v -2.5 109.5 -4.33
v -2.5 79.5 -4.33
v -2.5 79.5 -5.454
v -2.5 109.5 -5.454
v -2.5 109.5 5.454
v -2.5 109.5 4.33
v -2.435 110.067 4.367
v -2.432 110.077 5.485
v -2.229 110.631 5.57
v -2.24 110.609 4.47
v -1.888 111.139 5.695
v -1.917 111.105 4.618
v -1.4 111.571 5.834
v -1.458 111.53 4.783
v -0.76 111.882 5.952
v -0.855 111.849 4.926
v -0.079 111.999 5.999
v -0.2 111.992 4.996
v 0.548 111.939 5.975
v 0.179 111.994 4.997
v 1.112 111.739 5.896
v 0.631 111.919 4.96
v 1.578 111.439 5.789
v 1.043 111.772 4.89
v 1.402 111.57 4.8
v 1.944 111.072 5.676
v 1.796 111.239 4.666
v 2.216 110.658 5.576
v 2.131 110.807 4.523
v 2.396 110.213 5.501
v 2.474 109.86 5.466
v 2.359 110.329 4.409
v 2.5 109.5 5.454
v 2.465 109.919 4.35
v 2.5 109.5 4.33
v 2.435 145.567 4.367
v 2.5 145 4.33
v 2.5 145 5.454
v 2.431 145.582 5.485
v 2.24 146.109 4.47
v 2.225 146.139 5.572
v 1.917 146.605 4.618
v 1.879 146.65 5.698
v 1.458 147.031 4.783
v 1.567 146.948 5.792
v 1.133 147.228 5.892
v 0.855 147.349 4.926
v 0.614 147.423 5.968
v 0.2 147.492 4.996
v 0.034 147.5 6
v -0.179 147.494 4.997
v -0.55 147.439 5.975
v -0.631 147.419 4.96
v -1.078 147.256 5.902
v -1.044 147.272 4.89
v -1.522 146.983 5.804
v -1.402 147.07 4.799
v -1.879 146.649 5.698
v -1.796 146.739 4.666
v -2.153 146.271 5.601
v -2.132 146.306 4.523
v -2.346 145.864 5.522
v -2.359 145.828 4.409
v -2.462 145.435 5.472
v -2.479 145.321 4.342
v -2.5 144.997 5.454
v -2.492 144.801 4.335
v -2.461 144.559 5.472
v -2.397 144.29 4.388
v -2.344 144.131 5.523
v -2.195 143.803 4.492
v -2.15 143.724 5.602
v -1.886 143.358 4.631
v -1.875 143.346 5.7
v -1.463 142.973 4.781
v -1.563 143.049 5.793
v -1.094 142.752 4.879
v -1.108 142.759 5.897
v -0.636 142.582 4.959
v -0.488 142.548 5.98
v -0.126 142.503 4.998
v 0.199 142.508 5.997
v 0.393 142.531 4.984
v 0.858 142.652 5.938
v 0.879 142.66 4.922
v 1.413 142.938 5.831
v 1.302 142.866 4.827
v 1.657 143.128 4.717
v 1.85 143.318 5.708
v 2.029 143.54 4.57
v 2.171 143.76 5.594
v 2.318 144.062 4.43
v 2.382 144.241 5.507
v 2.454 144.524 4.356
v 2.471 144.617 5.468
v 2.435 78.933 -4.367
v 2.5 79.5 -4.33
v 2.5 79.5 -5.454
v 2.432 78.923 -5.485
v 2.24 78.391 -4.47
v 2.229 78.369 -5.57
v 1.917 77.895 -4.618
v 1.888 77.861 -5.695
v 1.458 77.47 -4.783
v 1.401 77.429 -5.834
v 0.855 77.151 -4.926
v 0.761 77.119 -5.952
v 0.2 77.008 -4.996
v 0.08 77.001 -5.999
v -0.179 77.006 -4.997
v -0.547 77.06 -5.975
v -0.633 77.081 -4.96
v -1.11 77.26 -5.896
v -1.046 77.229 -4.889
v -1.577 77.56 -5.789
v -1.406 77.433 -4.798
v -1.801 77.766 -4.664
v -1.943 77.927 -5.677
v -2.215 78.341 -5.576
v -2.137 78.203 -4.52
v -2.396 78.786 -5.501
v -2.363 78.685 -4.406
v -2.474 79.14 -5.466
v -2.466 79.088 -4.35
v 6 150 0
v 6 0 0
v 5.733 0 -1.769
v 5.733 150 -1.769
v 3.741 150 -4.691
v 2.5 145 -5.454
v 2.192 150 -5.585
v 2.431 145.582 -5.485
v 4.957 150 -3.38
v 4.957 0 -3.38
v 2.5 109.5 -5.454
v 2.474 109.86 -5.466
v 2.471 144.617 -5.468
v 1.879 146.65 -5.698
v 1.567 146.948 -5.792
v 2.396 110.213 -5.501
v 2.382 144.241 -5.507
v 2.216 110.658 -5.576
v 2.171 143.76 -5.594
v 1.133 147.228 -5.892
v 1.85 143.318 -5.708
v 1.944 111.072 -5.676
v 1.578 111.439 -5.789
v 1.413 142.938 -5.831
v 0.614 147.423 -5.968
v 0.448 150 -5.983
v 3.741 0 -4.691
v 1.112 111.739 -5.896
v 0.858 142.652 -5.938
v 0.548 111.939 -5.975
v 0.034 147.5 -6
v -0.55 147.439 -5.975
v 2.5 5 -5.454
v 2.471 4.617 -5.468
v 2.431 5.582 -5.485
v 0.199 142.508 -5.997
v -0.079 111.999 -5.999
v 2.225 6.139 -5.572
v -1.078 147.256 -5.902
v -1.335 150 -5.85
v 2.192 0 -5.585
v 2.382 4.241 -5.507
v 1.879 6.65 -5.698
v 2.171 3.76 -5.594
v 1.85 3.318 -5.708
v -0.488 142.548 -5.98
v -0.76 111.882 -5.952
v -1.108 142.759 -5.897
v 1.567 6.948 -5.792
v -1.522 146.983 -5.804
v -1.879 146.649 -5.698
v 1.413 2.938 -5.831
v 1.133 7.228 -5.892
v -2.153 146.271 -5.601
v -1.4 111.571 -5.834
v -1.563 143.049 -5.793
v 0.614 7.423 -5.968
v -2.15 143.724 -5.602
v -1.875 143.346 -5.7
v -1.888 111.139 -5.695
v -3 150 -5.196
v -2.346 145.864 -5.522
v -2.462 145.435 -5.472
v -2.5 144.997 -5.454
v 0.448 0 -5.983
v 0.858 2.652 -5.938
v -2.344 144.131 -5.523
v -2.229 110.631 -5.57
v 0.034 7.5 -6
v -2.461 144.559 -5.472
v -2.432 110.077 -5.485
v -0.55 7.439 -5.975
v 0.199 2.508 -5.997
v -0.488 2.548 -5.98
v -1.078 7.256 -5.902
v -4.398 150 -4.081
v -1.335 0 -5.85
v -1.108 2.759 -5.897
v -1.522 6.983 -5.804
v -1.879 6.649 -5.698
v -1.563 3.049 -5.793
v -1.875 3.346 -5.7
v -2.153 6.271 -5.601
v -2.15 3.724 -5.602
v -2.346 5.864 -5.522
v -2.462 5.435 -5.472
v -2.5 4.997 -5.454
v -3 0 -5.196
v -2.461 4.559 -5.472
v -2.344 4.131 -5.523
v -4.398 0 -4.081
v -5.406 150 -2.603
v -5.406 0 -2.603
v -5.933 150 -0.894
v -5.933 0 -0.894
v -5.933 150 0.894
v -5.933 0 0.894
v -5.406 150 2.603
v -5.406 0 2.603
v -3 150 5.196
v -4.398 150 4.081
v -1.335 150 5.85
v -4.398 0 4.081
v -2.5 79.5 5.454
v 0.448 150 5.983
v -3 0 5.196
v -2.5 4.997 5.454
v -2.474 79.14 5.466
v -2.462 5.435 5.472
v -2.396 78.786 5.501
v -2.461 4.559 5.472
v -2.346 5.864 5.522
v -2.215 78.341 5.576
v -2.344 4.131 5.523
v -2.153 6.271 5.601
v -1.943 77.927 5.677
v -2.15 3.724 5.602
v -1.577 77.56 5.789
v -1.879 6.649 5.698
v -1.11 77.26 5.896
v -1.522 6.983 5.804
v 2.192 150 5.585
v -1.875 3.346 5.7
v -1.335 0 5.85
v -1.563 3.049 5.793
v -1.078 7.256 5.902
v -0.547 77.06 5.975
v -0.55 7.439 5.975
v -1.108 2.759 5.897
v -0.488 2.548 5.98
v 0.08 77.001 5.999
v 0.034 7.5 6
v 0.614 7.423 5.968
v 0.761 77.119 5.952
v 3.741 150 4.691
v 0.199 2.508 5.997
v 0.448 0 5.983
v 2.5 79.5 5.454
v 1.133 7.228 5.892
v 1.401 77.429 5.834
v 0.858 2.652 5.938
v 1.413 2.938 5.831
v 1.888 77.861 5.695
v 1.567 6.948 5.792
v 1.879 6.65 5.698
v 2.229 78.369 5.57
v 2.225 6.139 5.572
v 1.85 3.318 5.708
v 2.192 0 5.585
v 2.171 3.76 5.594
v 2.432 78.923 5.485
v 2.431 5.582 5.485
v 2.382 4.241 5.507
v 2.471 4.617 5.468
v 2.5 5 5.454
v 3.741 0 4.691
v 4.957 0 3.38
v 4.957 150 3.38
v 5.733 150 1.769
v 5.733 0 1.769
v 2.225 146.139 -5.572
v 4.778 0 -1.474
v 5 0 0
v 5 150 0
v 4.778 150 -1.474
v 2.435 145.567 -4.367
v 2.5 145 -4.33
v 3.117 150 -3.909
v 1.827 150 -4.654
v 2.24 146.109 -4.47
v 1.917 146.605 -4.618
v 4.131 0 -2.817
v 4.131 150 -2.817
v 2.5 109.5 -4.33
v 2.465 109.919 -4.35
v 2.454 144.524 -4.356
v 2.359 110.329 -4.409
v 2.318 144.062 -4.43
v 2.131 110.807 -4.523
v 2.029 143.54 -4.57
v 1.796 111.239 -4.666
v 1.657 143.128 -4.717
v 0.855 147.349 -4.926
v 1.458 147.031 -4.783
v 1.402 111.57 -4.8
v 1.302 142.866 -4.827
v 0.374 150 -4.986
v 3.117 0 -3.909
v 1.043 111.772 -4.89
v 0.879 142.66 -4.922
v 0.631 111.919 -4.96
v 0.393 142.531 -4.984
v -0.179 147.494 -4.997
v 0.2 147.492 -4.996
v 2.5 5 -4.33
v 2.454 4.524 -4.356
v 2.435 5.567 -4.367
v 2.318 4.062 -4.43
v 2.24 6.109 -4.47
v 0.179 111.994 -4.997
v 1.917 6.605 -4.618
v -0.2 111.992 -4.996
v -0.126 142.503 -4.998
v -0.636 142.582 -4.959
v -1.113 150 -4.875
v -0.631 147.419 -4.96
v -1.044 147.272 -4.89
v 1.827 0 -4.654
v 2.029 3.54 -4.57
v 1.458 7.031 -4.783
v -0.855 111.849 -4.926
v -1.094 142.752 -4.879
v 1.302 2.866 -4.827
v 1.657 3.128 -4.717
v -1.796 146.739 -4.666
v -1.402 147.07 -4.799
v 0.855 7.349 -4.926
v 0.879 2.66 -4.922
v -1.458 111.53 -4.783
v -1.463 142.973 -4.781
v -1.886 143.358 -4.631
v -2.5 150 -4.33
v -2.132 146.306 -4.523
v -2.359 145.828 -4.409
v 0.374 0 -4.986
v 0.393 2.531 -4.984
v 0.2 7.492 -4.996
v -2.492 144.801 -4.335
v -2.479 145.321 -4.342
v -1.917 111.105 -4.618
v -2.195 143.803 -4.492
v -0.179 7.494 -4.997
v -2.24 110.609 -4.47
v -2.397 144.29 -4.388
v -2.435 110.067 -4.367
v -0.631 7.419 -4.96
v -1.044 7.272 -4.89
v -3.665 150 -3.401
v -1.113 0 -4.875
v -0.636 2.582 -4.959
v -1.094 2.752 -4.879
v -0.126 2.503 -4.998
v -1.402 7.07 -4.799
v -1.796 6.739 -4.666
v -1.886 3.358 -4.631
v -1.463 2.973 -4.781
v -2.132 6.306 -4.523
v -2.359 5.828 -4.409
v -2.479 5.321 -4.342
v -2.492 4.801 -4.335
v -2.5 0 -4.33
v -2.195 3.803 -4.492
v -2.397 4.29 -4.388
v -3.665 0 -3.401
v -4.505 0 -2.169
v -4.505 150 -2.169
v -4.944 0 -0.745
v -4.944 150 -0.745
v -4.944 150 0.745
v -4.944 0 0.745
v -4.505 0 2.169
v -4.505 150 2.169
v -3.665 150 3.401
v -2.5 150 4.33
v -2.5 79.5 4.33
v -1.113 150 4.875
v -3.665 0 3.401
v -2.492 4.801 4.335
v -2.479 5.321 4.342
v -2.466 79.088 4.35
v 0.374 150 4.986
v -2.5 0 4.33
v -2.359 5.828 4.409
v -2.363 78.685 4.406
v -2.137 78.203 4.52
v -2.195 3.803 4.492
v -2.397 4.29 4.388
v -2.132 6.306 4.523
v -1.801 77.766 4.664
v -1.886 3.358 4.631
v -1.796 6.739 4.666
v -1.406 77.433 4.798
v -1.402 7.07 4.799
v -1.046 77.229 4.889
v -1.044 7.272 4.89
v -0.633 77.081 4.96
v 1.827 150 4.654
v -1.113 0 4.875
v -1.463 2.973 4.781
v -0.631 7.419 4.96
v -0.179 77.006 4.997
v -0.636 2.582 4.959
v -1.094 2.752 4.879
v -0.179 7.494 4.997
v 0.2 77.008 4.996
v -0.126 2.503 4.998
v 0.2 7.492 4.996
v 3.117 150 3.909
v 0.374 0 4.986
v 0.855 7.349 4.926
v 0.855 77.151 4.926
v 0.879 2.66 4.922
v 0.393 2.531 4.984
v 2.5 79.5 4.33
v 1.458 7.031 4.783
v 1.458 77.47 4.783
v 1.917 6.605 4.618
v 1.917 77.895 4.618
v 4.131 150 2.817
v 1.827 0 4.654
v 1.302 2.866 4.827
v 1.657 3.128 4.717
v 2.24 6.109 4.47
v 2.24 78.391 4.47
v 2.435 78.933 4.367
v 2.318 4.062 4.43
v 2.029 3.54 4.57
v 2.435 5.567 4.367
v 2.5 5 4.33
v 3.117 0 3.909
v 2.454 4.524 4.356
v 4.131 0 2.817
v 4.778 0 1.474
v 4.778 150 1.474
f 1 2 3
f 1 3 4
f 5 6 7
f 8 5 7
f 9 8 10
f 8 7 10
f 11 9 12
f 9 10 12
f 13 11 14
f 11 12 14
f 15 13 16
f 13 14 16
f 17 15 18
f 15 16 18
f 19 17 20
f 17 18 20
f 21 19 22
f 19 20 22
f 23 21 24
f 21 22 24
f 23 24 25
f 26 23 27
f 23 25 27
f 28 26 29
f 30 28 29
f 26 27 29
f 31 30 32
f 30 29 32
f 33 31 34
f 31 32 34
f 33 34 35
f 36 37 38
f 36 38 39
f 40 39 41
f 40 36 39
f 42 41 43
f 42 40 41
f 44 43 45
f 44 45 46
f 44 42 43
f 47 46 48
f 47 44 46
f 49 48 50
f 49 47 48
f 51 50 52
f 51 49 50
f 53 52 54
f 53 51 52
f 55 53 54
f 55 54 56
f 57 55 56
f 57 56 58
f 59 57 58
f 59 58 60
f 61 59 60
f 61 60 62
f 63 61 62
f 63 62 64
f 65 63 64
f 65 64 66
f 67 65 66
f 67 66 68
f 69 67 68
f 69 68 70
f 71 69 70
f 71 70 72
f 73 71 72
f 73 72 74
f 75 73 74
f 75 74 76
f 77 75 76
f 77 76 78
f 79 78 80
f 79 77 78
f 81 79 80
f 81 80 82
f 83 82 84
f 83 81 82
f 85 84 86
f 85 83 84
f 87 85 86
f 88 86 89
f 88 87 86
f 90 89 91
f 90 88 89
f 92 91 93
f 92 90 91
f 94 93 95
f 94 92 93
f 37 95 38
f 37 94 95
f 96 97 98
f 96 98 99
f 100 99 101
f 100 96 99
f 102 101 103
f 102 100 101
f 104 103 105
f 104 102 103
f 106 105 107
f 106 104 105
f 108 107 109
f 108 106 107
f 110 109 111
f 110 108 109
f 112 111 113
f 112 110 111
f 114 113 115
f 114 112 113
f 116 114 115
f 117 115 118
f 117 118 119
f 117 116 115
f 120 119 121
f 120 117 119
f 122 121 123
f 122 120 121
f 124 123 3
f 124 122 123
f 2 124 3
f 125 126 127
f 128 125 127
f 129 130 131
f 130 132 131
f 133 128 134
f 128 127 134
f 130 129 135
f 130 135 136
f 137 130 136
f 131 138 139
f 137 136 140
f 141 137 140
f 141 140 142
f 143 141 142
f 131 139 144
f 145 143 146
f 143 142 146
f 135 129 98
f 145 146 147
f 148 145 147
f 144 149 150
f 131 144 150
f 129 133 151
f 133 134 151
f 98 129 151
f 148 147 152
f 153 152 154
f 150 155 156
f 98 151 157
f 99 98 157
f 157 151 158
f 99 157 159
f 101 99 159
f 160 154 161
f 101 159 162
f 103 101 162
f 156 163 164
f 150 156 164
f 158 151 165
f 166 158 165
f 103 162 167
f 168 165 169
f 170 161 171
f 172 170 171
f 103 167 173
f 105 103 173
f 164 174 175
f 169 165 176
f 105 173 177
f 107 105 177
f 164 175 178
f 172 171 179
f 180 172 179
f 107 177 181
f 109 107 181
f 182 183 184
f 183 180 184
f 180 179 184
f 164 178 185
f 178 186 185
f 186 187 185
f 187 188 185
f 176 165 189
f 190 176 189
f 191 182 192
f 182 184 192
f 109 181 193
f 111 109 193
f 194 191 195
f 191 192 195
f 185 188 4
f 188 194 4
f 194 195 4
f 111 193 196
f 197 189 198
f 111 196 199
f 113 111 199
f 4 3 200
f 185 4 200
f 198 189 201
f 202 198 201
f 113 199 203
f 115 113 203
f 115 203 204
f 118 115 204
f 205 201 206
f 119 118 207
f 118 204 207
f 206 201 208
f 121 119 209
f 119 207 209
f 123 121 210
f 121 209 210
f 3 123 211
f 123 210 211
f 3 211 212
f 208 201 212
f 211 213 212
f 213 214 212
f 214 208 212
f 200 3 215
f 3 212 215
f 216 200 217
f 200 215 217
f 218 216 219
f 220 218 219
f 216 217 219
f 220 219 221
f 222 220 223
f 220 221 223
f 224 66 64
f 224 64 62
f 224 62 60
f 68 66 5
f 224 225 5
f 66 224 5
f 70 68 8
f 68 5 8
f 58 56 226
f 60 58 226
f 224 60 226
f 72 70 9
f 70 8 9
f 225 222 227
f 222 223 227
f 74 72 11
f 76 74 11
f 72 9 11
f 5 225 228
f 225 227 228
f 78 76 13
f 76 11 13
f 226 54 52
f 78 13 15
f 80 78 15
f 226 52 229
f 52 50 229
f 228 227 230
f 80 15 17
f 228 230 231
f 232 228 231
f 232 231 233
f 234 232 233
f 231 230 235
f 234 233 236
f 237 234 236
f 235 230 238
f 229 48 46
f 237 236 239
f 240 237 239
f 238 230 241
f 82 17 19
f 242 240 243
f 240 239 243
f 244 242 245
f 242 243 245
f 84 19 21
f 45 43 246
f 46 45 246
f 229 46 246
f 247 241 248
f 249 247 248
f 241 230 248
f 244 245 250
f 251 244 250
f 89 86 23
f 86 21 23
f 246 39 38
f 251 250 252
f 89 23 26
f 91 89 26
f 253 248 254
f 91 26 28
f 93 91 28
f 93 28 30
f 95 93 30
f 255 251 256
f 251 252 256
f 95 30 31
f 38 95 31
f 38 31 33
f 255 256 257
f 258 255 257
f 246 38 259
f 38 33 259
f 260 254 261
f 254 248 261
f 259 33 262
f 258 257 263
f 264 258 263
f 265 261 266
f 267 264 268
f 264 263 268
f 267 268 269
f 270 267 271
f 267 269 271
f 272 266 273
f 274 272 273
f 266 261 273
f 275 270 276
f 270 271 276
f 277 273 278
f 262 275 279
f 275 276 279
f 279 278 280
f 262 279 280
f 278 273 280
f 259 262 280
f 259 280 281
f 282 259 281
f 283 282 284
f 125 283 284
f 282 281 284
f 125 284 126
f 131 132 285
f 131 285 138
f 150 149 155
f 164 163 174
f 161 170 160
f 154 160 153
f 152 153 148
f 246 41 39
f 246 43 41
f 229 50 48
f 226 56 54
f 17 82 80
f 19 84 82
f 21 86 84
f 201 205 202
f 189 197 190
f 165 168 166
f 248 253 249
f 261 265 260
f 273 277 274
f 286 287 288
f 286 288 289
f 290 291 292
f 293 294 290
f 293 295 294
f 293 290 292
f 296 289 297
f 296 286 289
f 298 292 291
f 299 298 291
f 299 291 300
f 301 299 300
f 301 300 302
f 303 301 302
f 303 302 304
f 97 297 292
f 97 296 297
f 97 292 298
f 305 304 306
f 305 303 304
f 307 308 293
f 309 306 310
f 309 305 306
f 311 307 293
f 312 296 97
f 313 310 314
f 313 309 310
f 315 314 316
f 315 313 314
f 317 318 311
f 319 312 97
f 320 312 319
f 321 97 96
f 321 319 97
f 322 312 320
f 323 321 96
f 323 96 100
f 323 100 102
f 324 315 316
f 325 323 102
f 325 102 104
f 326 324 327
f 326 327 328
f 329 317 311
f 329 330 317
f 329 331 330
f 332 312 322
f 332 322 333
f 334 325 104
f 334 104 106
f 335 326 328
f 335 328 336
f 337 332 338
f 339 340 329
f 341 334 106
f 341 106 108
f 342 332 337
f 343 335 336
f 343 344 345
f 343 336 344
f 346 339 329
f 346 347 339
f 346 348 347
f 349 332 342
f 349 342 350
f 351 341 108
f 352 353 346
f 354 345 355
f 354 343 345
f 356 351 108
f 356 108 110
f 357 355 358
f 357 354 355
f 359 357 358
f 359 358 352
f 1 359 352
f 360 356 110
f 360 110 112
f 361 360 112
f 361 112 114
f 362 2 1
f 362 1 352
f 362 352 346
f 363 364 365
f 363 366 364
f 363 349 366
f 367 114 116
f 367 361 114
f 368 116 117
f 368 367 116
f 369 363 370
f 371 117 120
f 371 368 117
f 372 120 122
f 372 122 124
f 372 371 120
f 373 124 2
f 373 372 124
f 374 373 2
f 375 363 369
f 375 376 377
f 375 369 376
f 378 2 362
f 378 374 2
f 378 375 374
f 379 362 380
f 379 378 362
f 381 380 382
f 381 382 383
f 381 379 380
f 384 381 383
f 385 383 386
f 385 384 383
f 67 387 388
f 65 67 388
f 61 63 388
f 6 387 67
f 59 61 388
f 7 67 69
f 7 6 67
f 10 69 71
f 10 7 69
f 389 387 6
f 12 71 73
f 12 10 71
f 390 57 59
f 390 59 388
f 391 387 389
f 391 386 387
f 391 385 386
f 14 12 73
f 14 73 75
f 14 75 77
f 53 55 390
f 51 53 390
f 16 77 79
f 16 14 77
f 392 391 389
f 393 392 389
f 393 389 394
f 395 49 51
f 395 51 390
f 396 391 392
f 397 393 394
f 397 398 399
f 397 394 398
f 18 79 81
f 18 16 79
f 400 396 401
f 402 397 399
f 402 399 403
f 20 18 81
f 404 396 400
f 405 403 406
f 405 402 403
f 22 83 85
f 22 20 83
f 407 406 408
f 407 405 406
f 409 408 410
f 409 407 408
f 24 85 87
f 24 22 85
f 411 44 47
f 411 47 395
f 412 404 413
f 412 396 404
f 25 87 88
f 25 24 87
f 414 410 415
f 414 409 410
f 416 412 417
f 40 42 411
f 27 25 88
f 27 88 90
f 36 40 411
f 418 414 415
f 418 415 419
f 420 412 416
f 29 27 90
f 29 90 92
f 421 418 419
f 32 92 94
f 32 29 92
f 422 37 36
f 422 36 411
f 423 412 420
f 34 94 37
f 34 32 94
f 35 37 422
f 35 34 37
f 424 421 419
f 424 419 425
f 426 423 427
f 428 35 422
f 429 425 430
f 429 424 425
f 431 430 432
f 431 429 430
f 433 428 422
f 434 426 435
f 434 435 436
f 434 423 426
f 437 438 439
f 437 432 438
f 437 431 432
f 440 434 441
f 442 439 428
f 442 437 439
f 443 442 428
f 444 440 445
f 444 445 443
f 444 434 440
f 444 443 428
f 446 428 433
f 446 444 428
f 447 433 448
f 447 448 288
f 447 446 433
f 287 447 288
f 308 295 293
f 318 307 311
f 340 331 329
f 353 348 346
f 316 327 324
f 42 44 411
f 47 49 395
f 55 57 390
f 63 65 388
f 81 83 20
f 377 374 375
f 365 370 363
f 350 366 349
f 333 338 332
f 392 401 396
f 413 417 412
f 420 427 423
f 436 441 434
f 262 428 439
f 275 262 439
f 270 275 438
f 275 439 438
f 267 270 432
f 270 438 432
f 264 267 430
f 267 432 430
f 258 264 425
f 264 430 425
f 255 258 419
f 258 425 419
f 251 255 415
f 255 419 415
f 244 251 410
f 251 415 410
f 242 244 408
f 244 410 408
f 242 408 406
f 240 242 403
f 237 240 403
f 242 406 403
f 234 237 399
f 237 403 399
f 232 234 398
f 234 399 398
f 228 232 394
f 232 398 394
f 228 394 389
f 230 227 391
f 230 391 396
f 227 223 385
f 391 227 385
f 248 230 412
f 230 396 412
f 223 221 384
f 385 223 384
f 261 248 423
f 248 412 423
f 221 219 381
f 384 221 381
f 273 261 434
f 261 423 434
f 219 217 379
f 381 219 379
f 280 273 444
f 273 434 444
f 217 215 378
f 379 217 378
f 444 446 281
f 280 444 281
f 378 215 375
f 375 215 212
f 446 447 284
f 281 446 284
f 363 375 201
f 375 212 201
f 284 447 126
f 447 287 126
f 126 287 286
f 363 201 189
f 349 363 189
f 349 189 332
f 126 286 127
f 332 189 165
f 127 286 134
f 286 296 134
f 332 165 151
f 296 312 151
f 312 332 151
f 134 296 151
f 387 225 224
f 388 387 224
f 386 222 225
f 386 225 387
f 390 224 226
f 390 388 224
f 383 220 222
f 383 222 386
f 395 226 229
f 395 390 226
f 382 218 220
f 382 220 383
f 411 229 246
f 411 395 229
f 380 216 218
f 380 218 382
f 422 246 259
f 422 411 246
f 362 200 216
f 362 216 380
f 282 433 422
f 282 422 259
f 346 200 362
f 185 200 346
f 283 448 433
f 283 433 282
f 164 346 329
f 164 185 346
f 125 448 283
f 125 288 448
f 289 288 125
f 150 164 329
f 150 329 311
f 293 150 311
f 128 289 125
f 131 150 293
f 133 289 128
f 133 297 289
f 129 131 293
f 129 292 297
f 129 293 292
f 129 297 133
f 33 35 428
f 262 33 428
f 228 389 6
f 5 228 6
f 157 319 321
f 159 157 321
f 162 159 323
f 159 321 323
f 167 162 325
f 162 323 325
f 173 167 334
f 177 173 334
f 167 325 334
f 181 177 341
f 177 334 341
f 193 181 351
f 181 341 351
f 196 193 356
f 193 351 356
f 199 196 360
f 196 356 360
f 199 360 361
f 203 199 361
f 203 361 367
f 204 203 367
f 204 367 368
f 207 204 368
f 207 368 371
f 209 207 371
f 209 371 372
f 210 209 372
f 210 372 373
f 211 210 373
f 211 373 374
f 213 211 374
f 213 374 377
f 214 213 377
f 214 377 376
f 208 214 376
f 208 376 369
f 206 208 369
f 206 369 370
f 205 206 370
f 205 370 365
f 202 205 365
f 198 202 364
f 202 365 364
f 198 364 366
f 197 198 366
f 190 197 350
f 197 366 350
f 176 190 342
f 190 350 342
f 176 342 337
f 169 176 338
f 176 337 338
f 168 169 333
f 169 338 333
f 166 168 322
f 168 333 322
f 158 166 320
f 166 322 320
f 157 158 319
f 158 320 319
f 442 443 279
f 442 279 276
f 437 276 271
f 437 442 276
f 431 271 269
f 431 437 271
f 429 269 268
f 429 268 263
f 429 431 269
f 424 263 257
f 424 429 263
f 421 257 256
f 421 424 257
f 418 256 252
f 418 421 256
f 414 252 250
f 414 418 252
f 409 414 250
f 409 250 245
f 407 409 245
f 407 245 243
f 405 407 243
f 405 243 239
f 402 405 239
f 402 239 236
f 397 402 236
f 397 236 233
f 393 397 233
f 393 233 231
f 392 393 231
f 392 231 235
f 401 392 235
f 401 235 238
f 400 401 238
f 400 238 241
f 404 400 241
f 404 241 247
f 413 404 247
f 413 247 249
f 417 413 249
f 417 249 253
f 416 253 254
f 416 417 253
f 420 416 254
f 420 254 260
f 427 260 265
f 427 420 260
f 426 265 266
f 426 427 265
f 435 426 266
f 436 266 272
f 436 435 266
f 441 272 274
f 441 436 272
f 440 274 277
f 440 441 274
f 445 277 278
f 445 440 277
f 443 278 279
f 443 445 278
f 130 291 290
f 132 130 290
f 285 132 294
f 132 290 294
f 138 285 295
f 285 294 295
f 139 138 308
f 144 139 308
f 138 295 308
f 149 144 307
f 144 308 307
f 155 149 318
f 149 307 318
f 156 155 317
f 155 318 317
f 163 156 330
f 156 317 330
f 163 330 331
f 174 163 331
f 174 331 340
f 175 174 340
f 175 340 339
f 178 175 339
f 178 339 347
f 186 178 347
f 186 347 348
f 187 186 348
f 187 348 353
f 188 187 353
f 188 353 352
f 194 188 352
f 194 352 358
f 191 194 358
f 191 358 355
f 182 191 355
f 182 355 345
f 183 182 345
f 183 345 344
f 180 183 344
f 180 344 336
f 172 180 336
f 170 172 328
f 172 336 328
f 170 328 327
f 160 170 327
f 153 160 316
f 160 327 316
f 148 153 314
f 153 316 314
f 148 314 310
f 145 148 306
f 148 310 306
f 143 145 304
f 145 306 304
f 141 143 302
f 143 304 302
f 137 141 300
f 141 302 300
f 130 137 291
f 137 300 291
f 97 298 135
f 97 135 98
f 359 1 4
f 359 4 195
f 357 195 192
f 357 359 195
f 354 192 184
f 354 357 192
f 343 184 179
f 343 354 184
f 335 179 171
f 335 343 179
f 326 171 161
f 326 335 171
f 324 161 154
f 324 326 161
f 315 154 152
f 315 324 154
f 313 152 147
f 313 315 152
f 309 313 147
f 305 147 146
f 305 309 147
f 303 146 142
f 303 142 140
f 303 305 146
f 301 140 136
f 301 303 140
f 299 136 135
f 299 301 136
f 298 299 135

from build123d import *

# Parameters (mm, degrees)
SZKIC1_R                        = 6
SZKIC1_R_2                      = 5
DODANIE_WYCI_GNI_CIE1_DEPTH     = 150
SZKIC3_R                        = 2.5
WYTNIJ_WYCI_GNI_CIE2_DEPTH      = 7
WYTNIJ_WYCI_GNI_CIE2_DEPTH_BACK = 7


with BuildPart() as part:
    # Szkic1 → Dodanie-wyciągnięcie1 (new body)
    with BuildSketch(Plane(origin=(0, 0, 0), x_dir=(1, 0, 0), z_dir=(0, 1, 0))):
        Circle(SZKIC1_R)
        Circle(SZKIC1_R_2, mode=Mode.SUBTRACT)
    extrude(amount=DODANIE_WYCI_GNI_CIE1_DEPTH)

    # Szkic3 → Wytnij-wyciągnięcie2 (cut, two sides)
    with BuildSketch(Plane.XY) as wytnij_wyci_gni_cie2_sk:
        with Locations((0, 145)):
            Circle(SZKIC3_R)
        with Locations((0, 5)):
            Circle(SZKIC3_R)
        with BuildLine():
            Line((-2.5, 79.5), (-2.5, 109.5))
            ThreePointArc((-2.5, 109.5), (0, 112), (2.5, 109.5))
            Line((2.5, 109.5), (2.5, 79.5))
            ThreePointArc((2.5, 79.5), (0, 77), (-2.5, 79.5))
        make_face()
    extrude(amount=WYTNIJ_WYCI_GNI_CIE2_DEPTH, mode=Mode.SUBTRACT)
    extrude(wytnij_wyci_gni_cie2_sk.sketch, amount=-WYTNIJ_WYCI_GNI_CIE2_DEPTH_BACK, mode=Mode.SUBTRACT)


solid = part.part
